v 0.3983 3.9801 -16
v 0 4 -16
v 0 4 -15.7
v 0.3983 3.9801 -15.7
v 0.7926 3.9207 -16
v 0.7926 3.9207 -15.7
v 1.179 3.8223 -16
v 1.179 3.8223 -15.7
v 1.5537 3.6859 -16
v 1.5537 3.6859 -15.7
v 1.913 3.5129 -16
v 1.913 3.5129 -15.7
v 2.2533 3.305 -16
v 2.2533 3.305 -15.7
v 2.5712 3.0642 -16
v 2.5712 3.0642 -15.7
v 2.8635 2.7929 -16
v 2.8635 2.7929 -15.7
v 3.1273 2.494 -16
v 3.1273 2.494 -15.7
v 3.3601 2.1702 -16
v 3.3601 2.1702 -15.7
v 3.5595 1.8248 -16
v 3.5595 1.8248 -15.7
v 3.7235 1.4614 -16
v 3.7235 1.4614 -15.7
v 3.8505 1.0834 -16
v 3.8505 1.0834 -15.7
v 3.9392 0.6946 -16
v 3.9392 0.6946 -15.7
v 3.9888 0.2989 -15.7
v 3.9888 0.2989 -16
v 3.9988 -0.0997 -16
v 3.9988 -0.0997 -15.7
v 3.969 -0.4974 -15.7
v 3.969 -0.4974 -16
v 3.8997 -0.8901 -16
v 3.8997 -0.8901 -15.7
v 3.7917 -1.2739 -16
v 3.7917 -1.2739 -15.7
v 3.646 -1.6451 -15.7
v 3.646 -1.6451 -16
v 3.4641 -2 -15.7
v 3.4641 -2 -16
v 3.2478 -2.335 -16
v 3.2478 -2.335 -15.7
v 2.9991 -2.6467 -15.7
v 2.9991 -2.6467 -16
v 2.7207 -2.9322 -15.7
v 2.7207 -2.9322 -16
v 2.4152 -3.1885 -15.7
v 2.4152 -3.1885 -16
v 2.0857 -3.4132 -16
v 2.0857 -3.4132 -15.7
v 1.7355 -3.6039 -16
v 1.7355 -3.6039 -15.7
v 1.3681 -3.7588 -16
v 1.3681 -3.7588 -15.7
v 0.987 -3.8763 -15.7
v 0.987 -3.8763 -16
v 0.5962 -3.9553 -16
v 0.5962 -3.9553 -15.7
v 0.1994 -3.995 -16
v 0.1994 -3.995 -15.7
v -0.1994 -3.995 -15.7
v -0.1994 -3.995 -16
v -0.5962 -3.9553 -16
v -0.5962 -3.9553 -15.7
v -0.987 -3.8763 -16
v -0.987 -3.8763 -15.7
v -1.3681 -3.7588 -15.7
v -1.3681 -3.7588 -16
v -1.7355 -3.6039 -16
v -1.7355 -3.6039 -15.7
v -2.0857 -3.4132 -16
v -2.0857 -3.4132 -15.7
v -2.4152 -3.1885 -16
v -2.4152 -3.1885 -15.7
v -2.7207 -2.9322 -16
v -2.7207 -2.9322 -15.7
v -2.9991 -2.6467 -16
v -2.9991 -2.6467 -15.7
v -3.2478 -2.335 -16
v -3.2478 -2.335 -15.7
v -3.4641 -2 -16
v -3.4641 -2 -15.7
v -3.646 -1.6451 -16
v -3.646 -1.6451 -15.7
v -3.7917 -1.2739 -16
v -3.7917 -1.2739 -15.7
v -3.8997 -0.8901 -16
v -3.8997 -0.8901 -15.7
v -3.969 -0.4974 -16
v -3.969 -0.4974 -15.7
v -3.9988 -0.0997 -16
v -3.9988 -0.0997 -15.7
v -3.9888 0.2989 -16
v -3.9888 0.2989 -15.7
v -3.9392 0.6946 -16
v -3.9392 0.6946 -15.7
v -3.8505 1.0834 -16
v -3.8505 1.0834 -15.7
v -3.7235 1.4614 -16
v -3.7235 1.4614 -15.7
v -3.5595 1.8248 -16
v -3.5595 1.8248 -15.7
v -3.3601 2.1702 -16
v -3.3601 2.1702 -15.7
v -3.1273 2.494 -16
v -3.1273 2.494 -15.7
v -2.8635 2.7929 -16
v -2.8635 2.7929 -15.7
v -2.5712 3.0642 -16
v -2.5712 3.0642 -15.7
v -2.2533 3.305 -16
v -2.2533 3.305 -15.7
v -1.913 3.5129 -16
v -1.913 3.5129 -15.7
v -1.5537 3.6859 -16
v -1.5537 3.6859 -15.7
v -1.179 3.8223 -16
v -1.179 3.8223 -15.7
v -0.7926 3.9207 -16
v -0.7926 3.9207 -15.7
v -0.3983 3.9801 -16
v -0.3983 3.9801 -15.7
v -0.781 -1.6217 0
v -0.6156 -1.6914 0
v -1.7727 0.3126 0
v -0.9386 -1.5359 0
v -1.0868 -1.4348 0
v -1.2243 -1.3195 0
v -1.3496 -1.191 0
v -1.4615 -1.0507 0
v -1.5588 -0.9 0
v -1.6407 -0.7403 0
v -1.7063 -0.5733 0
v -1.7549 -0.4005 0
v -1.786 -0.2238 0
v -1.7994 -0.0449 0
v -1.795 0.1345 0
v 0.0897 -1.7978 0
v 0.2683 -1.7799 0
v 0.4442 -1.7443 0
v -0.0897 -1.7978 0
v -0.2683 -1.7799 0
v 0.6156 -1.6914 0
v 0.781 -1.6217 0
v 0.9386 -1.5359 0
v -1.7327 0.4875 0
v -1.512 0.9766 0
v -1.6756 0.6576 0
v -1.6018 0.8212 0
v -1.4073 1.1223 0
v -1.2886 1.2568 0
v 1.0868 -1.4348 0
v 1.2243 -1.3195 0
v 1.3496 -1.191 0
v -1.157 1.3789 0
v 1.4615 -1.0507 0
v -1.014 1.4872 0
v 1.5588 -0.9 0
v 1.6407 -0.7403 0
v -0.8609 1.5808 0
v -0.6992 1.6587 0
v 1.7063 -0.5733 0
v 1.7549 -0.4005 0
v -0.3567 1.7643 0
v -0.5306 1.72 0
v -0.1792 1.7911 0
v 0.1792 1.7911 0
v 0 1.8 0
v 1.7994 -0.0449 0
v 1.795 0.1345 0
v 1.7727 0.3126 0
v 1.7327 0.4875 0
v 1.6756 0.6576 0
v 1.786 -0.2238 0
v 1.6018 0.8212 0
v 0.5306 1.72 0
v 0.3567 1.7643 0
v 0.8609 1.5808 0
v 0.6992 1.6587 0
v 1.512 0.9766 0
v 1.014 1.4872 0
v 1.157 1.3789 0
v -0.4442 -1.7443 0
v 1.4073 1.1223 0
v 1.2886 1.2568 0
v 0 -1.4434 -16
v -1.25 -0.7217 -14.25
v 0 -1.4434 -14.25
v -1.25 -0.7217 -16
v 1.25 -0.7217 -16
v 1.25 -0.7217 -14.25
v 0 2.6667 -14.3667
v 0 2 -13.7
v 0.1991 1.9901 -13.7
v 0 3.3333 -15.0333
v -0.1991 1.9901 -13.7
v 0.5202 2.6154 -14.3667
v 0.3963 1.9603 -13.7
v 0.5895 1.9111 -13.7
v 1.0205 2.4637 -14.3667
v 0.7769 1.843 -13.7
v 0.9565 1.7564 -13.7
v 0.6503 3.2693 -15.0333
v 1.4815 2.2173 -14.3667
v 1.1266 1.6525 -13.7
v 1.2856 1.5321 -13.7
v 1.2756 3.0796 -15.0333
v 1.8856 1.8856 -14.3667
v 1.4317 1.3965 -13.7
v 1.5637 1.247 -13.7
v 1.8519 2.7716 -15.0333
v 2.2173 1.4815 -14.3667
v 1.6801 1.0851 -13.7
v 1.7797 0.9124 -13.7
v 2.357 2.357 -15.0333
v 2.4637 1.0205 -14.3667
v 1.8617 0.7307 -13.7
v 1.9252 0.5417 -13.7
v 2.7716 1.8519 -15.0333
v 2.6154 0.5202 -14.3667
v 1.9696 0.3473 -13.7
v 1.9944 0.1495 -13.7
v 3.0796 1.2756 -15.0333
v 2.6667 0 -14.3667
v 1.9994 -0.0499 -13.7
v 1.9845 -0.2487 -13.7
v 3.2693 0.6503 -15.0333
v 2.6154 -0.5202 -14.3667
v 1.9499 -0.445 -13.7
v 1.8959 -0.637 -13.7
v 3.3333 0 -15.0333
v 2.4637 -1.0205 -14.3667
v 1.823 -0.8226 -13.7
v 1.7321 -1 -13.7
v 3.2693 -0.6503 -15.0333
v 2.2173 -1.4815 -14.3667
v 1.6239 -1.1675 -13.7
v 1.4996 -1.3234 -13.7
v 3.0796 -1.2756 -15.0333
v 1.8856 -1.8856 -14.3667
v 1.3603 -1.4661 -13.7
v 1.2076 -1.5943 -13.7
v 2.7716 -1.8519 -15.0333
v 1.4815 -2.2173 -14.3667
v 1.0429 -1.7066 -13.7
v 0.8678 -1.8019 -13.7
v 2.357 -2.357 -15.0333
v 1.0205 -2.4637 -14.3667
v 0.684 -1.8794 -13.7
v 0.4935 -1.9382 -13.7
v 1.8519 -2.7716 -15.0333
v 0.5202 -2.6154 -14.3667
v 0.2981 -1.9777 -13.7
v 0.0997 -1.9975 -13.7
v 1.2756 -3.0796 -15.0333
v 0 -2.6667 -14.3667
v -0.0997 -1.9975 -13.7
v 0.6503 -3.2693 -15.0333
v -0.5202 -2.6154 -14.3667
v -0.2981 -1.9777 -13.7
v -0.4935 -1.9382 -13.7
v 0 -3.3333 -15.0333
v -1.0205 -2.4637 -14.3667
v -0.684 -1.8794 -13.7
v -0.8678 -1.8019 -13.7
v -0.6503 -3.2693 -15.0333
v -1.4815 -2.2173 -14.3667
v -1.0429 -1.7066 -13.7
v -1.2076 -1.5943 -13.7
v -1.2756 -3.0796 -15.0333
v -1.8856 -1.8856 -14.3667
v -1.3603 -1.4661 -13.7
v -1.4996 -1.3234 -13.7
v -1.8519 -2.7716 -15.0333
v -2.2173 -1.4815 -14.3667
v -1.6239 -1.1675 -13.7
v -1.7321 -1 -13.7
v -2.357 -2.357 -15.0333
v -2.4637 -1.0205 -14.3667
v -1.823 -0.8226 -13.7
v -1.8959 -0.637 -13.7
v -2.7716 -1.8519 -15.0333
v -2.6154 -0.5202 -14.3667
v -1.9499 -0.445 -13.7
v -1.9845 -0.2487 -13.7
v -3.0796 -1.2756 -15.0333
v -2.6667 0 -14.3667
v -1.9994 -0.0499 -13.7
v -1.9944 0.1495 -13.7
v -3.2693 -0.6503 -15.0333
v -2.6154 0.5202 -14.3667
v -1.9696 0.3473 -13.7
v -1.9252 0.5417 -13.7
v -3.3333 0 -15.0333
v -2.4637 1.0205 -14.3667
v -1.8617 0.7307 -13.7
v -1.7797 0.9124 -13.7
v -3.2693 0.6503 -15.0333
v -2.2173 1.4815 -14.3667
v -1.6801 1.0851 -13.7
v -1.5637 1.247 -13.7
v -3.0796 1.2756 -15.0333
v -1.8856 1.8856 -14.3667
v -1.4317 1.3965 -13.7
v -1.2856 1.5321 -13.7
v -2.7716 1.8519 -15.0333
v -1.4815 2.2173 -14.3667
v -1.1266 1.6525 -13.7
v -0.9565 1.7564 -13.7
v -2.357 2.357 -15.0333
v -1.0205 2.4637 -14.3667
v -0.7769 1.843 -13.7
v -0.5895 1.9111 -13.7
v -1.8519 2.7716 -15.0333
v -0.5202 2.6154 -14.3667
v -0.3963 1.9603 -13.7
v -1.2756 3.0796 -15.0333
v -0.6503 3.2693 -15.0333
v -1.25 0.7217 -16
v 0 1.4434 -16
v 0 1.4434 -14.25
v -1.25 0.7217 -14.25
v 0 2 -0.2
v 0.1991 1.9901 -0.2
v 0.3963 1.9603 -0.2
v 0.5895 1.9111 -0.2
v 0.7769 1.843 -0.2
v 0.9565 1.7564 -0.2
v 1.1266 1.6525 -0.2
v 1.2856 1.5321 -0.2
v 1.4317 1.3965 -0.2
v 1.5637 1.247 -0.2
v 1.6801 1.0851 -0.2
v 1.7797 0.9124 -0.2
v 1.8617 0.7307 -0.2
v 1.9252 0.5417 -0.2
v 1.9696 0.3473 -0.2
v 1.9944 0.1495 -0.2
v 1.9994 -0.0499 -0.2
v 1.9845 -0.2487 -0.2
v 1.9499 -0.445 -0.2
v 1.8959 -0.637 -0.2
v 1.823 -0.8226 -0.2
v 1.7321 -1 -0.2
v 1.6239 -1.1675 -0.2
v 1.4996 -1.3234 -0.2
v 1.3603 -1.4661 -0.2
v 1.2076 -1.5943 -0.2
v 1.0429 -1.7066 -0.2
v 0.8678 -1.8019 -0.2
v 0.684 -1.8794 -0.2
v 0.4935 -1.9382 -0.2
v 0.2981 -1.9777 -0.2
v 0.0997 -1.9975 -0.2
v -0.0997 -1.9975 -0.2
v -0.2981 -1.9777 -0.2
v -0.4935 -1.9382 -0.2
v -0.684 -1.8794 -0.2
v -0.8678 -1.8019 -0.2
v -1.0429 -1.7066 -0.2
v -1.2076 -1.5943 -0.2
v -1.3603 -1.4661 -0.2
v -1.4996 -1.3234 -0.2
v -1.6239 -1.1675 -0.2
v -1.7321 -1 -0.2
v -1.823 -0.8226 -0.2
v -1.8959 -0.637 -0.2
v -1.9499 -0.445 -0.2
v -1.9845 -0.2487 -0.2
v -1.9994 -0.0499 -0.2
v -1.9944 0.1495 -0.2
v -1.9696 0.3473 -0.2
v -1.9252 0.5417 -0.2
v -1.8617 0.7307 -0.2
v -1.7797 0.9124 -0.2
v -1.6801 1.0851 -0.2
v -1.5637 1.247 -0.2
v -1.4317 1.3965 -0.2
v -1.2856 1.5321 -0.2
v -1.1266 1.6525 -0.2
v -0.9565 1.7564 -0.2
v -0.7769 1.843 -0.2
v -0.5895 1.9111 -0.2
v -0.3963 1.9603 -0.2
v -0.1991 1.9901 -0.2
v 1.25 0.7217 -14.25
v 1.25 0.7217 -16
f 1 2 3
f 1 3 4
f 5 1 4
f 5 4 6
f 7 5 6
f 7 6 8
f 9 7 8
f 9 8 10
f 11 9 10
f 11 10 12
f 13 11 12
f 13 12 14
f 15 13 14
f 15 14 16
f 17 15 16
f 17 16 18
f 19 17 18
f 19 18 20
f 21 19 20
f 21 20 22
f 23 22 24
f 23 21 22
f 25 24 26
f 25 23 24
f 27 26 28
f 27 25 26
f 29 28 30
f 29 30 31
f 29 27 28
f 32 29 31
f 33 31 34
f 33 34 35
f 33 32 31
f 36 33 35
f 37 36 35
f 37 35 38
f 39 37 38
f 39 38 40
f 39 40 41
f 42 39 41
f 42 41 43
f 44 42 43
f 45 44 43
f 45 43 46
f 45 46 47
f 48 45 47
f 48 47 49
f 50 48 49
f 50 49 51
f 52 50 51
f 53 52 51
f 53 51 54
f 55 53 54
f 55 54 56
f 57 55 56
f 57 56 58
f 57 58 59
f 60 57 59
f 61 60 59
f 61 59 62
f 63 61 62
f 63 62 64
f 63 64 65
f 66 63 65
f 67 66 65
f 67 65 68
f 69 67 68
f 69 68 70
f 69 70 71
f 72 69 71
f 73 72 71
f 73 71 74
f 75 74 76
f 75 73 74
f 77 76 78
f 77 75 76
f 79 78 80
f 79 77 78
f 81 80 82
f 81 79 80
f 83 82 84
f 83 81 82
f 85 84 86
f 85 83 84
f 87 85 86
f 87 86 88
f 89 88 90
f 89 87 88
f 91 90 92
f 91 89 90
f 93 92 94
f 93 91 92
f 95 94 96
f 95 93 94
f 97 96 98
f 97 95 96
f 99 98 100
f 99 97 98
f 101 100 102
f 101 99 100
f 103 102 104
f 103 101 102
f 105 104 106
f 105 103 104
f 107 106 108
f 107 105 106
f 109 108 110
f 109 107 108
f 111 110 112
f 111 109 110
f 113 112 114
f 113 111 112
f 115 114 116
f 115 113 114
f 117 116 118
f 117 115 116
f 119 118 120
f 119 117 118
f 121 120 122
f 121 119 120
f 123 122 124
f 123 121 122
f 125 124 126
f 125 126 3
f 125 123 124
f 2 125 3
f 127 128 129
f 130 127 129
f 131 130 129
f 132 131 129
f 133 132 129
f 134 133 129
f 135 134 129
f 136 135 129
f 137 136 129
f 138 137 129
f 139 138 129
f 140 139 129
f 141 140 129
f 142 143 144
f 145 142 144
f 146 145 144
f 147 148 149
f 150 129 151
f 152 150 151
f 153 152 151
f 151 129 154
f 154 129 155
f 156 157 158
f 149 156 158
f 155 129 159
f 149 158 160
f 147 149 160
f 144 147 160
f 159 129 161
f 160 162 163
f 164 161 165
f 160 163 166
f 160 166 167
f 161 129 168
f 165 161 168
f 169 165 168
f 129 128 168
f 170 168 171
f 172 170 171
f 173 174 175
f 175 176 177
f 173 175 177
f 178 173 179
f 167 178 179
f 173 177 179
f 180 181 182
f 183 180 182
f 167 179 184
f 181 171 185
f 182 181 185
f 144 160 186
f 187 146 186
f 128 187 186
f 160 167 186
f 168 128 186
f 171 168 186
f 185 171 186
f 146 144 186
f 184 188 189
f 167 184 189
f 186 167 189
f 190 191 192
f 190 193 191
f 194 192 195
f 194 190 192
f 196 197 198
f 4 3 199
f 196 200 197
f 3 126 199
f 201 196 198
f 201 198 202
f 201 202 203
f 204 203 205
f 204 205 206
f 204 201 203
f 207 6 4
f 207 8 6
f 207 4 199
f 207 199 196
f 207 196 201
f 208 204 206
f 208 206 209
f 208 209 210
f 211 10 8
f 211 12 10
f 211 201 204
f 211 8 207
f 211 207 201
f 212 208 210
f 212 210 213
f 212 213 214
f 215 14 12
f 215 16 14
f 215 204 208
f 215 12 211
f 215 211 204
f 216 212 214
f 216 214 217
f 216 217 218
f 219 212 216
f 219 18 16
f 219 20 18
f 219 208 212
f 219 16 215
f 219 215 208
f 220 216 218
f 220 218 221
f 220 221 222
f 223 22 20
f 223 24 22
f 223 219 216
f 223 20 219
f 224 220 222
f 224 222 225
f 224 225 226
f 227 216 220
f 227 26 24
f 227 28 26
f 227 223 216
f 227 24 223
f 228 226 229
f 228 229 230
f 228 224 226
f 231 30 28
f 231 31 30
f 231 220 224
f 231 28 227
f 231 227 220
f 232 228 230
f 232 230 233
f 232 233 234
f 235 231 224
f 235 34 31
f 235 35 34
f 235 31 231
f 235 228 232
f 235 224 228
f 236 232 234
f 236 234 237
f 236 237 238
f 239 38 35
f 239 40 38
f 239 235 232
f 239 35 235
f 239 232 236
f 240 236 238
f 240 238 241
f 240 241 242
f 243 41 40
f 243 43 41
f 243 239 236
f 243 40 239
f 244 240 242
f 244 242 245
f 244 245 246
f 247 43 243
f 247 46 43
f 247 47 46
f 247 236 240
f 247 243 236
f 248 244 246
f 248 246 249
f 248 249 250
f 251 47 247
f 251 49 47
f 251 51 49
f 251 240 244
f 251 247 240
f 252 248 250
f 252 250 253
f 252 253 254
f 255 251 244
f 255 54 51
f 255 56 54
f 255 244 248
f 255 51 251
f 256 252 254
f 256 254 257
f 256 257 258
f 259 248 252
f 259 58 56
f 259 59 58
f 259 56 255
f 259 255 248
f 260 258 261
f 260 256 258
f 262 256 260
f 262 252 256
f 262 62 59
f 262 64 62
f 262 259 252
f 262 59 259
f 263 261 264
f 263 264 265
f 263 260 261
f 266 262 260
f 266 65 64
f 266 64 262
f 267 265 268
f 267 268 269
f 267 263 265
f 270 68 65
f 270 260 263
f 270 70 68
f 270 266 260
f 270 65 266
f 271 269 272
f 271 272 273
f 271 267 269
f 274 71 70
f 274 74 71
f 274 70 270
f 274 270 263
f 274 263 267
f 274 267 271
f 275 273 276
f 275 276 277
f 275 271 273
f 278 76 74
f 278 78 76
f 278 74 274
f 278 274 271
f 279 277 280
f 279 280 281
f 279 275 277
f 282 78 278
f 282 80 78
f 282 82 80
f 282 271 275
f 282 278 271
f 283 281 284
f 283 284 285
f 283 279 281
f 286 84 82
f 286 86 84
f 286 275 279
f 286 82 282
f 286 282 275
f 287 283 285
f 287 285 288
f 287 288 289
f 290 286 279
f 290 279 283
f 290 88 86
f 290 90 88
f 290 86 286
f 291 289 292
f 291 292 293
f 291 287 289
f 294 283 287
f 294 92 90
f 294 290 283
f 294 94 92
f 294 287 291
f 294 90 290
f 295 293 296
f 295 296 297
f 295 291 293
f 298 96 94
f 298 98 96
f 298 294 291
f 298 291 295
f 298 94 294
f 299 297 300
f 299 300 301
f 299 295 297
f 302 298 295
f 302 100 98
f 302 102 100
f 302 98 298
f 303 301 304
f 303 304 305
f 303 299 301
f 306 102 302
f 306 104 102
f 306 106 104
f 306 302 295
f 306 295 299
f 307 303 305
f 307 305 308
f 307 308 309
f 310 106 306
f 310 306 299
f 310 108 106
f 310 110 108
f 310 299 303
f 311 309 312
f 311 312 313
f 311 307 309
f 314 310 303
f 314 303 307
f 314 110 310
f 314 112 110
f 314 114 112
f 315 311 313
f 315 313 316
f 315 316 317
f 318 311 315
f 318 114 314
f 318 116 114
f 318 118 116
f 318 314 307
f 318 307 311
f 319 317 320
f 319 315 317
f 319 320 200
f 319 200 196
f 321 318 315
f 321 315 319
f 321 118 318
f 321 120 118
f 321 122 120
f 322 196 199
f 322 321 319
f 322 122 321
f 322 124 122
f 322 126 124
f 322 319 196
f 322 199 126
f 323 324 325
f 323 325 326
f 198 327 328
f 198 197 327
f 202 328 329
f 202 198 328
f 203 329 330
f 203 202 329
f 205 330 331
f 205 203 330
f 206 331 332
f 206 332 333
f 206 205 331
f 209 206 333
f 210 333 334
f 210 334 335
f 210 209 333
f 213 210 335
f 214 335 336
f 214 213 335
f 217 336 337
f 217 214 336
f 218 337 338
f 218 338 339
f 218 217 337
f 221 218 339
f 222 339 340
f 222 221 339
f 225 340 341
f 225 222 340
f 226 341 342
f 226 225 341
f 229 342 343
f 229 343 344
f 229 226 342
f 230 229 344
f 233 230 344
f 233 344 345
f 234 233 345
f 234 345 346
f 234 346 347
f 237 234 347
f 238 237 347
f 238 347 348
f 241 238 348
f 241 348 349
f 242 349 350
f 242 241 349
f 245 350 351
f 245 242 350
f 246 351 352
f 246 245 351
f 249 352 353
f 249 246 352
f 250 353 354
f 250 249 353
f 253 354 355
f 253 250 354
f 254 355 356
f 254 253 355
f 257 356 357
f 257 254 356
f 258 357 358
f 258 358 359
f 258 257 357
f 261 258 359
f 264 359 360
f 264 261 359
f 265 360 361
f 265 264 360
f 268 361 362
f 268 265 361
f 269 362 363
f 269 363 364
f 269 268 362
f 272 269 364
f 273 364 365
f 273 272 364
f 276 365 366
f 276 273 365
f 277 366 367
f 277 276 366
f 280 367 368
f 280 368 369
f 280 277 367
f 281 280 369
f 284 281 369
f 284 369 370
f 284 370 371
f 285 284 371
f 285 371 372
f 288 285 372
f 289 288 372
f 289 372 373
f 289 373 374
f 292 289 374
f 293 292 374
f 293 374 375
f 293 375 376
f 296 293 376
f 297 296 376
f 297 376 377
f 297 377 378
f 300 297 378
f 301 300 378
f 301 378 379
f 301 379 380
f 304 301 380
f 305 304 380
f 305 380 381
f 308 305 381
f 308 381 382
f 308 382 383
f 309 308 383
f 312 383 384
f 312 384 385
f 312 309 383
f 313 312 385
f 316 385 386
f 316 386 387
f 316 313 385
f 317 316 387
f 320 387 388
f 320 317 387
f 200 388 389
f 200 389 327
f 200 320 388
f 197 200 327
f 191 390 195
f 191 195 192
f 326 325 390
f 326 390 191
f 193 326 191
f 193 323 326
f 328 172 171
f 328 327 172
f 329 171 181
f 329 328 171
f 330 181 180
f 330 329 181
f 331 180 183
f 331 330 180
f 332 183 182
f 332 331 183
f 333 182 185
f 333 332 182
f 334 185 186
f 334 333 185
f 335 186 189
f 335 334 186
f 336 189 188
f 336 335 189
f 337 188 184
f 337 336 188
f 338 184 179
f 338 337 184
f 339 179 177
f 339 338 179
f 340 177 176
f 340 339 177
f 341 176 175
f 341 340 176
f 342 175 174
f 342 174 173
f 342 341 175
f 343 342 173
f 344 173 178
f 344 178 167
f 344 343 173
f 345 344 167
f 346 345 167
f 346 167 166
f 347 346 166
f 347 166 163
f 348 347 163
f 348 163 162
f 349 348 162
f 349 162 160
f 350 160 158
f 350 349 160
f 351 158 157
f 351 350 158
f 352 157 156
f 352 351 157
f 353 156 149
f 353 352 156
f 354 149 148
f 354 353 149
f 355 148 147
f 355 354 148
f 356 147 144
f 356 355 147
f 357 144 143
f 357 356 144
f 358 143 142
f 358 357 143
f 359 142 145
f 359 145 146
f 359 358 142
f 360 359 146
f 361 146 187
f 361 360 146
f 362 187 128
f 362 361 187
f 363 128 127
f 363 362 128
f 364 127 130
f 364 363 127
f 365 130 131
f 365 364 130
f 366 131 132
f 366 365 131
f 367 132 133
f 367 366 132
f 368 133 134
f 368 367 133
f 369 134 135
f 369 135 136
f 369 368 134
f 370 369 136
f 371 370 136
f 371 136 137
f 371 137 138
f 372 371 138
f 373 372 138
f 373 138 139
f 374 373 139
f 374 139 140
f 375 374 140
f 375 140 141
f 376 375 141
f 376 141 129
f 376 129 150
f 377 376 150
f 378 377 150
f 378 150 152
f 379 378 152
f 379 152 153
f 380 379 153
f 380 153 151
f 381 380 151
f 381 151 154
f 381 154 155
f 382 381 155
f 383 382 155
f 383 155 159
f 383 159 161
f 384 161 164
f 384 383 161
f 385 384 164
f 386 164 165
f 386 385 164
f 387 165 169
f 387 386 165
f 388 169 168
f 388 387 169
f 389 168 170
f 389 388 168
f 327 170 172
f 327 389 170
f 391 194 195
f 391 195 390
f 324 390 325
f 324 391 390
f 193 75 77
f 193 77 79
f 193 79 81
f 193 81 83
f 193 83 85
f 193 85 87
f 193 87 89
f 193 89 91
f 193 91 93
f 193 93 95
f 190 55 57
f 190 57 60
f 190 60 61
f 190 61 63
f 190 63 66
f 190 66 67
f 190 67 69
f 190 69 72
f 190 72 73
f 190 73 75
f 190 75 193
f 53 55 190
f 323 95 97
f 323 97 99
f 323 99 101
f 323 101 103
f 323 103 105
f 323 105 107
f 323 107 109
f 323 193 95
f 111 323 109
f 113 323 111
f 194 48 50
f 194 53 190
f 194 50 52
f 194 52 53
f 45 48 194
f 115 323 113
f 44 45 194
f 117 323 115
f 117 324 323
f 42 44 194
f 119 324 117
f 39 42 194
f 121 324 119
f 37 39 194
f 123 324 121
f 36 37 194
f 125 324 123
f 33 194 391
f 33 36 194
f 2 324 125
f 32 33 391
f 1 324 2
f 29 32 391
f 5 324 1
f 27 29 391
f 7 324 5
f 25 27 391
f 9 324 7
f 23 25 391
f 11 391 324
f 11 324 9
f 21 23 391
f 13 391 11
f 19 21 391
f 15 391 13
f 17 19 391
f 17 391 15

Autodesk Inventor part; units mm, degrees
ref_plane "YZ Plane" through (0, 0, 0) normal (1, 0, 0) x (0, 1, 0)
ref_plane "XZ Plane" through (0, 0, 0) normal (0, 1, 0) x (-1, 0, 0)
ref_plane "XY Plane" through (0, 0, 0) normal (0, 0, 1) x (1, 0, 0)
sketch "Sketch1" plane through (0, 0, 0) normal (1, 0, 0) x (0, 1, 0)
  line L0 (0, 0) -> (0, -16)
  line L1 (0, -16) -> (4, -16)
  line L2 (2, 0) -> (0, 0)
  line L3 (2, 0) -> (2, -13.7)
  line L4 (2, -13.7) -> (4, -15.7)
  line L5 (4, -15.7) -> (4, -16)
  dimension "d0" = 16
  dimension "d4" = 2
  dimension "d5" = 2.3
  dimension "d6" = 45
  dimension "d7" = 4
revolve "Revolution1" add sketch "Sketch1" angle 360 about axis through (0, 0, 0) along (0, 0, -1)
sketch "Sketch2" plane through (0, 0, -16) normal (0, 0, -1) x (-1, 0, 0)
  line L0 (0, 1.4434) -> (1.25, 0.7217)
  line L1 (1.25, 0.7217) -> (1.25, -0.7217)
  line L2 (1.25, -0.7217) -> (0, -1.4434)
  line L3 (0, -1.4434) -> (-1.25, -0.7217)
  line L4 (-1.25, -0.7217) -> (-1.25, 0.7217)
  line L5 (-1.25, 0.7217) -> (0, 1.4434)
  point P0 (0, 0)
  point P1 (0, 0)
  dimension "d9" = 2.5
extrude "Extrusion1" cut sketch "Sketch2" against normal blind 1.75
thread "Thread1" size "M4x0.7" class "6g" standard "ANSI Metric M Profile" length 24
chamfer "Chamfer1" distance 0.2 angle 45 1 edges at (0, -2, 0)
properties part number "MM-MMount_to_Motor-CS_Bolt-"
